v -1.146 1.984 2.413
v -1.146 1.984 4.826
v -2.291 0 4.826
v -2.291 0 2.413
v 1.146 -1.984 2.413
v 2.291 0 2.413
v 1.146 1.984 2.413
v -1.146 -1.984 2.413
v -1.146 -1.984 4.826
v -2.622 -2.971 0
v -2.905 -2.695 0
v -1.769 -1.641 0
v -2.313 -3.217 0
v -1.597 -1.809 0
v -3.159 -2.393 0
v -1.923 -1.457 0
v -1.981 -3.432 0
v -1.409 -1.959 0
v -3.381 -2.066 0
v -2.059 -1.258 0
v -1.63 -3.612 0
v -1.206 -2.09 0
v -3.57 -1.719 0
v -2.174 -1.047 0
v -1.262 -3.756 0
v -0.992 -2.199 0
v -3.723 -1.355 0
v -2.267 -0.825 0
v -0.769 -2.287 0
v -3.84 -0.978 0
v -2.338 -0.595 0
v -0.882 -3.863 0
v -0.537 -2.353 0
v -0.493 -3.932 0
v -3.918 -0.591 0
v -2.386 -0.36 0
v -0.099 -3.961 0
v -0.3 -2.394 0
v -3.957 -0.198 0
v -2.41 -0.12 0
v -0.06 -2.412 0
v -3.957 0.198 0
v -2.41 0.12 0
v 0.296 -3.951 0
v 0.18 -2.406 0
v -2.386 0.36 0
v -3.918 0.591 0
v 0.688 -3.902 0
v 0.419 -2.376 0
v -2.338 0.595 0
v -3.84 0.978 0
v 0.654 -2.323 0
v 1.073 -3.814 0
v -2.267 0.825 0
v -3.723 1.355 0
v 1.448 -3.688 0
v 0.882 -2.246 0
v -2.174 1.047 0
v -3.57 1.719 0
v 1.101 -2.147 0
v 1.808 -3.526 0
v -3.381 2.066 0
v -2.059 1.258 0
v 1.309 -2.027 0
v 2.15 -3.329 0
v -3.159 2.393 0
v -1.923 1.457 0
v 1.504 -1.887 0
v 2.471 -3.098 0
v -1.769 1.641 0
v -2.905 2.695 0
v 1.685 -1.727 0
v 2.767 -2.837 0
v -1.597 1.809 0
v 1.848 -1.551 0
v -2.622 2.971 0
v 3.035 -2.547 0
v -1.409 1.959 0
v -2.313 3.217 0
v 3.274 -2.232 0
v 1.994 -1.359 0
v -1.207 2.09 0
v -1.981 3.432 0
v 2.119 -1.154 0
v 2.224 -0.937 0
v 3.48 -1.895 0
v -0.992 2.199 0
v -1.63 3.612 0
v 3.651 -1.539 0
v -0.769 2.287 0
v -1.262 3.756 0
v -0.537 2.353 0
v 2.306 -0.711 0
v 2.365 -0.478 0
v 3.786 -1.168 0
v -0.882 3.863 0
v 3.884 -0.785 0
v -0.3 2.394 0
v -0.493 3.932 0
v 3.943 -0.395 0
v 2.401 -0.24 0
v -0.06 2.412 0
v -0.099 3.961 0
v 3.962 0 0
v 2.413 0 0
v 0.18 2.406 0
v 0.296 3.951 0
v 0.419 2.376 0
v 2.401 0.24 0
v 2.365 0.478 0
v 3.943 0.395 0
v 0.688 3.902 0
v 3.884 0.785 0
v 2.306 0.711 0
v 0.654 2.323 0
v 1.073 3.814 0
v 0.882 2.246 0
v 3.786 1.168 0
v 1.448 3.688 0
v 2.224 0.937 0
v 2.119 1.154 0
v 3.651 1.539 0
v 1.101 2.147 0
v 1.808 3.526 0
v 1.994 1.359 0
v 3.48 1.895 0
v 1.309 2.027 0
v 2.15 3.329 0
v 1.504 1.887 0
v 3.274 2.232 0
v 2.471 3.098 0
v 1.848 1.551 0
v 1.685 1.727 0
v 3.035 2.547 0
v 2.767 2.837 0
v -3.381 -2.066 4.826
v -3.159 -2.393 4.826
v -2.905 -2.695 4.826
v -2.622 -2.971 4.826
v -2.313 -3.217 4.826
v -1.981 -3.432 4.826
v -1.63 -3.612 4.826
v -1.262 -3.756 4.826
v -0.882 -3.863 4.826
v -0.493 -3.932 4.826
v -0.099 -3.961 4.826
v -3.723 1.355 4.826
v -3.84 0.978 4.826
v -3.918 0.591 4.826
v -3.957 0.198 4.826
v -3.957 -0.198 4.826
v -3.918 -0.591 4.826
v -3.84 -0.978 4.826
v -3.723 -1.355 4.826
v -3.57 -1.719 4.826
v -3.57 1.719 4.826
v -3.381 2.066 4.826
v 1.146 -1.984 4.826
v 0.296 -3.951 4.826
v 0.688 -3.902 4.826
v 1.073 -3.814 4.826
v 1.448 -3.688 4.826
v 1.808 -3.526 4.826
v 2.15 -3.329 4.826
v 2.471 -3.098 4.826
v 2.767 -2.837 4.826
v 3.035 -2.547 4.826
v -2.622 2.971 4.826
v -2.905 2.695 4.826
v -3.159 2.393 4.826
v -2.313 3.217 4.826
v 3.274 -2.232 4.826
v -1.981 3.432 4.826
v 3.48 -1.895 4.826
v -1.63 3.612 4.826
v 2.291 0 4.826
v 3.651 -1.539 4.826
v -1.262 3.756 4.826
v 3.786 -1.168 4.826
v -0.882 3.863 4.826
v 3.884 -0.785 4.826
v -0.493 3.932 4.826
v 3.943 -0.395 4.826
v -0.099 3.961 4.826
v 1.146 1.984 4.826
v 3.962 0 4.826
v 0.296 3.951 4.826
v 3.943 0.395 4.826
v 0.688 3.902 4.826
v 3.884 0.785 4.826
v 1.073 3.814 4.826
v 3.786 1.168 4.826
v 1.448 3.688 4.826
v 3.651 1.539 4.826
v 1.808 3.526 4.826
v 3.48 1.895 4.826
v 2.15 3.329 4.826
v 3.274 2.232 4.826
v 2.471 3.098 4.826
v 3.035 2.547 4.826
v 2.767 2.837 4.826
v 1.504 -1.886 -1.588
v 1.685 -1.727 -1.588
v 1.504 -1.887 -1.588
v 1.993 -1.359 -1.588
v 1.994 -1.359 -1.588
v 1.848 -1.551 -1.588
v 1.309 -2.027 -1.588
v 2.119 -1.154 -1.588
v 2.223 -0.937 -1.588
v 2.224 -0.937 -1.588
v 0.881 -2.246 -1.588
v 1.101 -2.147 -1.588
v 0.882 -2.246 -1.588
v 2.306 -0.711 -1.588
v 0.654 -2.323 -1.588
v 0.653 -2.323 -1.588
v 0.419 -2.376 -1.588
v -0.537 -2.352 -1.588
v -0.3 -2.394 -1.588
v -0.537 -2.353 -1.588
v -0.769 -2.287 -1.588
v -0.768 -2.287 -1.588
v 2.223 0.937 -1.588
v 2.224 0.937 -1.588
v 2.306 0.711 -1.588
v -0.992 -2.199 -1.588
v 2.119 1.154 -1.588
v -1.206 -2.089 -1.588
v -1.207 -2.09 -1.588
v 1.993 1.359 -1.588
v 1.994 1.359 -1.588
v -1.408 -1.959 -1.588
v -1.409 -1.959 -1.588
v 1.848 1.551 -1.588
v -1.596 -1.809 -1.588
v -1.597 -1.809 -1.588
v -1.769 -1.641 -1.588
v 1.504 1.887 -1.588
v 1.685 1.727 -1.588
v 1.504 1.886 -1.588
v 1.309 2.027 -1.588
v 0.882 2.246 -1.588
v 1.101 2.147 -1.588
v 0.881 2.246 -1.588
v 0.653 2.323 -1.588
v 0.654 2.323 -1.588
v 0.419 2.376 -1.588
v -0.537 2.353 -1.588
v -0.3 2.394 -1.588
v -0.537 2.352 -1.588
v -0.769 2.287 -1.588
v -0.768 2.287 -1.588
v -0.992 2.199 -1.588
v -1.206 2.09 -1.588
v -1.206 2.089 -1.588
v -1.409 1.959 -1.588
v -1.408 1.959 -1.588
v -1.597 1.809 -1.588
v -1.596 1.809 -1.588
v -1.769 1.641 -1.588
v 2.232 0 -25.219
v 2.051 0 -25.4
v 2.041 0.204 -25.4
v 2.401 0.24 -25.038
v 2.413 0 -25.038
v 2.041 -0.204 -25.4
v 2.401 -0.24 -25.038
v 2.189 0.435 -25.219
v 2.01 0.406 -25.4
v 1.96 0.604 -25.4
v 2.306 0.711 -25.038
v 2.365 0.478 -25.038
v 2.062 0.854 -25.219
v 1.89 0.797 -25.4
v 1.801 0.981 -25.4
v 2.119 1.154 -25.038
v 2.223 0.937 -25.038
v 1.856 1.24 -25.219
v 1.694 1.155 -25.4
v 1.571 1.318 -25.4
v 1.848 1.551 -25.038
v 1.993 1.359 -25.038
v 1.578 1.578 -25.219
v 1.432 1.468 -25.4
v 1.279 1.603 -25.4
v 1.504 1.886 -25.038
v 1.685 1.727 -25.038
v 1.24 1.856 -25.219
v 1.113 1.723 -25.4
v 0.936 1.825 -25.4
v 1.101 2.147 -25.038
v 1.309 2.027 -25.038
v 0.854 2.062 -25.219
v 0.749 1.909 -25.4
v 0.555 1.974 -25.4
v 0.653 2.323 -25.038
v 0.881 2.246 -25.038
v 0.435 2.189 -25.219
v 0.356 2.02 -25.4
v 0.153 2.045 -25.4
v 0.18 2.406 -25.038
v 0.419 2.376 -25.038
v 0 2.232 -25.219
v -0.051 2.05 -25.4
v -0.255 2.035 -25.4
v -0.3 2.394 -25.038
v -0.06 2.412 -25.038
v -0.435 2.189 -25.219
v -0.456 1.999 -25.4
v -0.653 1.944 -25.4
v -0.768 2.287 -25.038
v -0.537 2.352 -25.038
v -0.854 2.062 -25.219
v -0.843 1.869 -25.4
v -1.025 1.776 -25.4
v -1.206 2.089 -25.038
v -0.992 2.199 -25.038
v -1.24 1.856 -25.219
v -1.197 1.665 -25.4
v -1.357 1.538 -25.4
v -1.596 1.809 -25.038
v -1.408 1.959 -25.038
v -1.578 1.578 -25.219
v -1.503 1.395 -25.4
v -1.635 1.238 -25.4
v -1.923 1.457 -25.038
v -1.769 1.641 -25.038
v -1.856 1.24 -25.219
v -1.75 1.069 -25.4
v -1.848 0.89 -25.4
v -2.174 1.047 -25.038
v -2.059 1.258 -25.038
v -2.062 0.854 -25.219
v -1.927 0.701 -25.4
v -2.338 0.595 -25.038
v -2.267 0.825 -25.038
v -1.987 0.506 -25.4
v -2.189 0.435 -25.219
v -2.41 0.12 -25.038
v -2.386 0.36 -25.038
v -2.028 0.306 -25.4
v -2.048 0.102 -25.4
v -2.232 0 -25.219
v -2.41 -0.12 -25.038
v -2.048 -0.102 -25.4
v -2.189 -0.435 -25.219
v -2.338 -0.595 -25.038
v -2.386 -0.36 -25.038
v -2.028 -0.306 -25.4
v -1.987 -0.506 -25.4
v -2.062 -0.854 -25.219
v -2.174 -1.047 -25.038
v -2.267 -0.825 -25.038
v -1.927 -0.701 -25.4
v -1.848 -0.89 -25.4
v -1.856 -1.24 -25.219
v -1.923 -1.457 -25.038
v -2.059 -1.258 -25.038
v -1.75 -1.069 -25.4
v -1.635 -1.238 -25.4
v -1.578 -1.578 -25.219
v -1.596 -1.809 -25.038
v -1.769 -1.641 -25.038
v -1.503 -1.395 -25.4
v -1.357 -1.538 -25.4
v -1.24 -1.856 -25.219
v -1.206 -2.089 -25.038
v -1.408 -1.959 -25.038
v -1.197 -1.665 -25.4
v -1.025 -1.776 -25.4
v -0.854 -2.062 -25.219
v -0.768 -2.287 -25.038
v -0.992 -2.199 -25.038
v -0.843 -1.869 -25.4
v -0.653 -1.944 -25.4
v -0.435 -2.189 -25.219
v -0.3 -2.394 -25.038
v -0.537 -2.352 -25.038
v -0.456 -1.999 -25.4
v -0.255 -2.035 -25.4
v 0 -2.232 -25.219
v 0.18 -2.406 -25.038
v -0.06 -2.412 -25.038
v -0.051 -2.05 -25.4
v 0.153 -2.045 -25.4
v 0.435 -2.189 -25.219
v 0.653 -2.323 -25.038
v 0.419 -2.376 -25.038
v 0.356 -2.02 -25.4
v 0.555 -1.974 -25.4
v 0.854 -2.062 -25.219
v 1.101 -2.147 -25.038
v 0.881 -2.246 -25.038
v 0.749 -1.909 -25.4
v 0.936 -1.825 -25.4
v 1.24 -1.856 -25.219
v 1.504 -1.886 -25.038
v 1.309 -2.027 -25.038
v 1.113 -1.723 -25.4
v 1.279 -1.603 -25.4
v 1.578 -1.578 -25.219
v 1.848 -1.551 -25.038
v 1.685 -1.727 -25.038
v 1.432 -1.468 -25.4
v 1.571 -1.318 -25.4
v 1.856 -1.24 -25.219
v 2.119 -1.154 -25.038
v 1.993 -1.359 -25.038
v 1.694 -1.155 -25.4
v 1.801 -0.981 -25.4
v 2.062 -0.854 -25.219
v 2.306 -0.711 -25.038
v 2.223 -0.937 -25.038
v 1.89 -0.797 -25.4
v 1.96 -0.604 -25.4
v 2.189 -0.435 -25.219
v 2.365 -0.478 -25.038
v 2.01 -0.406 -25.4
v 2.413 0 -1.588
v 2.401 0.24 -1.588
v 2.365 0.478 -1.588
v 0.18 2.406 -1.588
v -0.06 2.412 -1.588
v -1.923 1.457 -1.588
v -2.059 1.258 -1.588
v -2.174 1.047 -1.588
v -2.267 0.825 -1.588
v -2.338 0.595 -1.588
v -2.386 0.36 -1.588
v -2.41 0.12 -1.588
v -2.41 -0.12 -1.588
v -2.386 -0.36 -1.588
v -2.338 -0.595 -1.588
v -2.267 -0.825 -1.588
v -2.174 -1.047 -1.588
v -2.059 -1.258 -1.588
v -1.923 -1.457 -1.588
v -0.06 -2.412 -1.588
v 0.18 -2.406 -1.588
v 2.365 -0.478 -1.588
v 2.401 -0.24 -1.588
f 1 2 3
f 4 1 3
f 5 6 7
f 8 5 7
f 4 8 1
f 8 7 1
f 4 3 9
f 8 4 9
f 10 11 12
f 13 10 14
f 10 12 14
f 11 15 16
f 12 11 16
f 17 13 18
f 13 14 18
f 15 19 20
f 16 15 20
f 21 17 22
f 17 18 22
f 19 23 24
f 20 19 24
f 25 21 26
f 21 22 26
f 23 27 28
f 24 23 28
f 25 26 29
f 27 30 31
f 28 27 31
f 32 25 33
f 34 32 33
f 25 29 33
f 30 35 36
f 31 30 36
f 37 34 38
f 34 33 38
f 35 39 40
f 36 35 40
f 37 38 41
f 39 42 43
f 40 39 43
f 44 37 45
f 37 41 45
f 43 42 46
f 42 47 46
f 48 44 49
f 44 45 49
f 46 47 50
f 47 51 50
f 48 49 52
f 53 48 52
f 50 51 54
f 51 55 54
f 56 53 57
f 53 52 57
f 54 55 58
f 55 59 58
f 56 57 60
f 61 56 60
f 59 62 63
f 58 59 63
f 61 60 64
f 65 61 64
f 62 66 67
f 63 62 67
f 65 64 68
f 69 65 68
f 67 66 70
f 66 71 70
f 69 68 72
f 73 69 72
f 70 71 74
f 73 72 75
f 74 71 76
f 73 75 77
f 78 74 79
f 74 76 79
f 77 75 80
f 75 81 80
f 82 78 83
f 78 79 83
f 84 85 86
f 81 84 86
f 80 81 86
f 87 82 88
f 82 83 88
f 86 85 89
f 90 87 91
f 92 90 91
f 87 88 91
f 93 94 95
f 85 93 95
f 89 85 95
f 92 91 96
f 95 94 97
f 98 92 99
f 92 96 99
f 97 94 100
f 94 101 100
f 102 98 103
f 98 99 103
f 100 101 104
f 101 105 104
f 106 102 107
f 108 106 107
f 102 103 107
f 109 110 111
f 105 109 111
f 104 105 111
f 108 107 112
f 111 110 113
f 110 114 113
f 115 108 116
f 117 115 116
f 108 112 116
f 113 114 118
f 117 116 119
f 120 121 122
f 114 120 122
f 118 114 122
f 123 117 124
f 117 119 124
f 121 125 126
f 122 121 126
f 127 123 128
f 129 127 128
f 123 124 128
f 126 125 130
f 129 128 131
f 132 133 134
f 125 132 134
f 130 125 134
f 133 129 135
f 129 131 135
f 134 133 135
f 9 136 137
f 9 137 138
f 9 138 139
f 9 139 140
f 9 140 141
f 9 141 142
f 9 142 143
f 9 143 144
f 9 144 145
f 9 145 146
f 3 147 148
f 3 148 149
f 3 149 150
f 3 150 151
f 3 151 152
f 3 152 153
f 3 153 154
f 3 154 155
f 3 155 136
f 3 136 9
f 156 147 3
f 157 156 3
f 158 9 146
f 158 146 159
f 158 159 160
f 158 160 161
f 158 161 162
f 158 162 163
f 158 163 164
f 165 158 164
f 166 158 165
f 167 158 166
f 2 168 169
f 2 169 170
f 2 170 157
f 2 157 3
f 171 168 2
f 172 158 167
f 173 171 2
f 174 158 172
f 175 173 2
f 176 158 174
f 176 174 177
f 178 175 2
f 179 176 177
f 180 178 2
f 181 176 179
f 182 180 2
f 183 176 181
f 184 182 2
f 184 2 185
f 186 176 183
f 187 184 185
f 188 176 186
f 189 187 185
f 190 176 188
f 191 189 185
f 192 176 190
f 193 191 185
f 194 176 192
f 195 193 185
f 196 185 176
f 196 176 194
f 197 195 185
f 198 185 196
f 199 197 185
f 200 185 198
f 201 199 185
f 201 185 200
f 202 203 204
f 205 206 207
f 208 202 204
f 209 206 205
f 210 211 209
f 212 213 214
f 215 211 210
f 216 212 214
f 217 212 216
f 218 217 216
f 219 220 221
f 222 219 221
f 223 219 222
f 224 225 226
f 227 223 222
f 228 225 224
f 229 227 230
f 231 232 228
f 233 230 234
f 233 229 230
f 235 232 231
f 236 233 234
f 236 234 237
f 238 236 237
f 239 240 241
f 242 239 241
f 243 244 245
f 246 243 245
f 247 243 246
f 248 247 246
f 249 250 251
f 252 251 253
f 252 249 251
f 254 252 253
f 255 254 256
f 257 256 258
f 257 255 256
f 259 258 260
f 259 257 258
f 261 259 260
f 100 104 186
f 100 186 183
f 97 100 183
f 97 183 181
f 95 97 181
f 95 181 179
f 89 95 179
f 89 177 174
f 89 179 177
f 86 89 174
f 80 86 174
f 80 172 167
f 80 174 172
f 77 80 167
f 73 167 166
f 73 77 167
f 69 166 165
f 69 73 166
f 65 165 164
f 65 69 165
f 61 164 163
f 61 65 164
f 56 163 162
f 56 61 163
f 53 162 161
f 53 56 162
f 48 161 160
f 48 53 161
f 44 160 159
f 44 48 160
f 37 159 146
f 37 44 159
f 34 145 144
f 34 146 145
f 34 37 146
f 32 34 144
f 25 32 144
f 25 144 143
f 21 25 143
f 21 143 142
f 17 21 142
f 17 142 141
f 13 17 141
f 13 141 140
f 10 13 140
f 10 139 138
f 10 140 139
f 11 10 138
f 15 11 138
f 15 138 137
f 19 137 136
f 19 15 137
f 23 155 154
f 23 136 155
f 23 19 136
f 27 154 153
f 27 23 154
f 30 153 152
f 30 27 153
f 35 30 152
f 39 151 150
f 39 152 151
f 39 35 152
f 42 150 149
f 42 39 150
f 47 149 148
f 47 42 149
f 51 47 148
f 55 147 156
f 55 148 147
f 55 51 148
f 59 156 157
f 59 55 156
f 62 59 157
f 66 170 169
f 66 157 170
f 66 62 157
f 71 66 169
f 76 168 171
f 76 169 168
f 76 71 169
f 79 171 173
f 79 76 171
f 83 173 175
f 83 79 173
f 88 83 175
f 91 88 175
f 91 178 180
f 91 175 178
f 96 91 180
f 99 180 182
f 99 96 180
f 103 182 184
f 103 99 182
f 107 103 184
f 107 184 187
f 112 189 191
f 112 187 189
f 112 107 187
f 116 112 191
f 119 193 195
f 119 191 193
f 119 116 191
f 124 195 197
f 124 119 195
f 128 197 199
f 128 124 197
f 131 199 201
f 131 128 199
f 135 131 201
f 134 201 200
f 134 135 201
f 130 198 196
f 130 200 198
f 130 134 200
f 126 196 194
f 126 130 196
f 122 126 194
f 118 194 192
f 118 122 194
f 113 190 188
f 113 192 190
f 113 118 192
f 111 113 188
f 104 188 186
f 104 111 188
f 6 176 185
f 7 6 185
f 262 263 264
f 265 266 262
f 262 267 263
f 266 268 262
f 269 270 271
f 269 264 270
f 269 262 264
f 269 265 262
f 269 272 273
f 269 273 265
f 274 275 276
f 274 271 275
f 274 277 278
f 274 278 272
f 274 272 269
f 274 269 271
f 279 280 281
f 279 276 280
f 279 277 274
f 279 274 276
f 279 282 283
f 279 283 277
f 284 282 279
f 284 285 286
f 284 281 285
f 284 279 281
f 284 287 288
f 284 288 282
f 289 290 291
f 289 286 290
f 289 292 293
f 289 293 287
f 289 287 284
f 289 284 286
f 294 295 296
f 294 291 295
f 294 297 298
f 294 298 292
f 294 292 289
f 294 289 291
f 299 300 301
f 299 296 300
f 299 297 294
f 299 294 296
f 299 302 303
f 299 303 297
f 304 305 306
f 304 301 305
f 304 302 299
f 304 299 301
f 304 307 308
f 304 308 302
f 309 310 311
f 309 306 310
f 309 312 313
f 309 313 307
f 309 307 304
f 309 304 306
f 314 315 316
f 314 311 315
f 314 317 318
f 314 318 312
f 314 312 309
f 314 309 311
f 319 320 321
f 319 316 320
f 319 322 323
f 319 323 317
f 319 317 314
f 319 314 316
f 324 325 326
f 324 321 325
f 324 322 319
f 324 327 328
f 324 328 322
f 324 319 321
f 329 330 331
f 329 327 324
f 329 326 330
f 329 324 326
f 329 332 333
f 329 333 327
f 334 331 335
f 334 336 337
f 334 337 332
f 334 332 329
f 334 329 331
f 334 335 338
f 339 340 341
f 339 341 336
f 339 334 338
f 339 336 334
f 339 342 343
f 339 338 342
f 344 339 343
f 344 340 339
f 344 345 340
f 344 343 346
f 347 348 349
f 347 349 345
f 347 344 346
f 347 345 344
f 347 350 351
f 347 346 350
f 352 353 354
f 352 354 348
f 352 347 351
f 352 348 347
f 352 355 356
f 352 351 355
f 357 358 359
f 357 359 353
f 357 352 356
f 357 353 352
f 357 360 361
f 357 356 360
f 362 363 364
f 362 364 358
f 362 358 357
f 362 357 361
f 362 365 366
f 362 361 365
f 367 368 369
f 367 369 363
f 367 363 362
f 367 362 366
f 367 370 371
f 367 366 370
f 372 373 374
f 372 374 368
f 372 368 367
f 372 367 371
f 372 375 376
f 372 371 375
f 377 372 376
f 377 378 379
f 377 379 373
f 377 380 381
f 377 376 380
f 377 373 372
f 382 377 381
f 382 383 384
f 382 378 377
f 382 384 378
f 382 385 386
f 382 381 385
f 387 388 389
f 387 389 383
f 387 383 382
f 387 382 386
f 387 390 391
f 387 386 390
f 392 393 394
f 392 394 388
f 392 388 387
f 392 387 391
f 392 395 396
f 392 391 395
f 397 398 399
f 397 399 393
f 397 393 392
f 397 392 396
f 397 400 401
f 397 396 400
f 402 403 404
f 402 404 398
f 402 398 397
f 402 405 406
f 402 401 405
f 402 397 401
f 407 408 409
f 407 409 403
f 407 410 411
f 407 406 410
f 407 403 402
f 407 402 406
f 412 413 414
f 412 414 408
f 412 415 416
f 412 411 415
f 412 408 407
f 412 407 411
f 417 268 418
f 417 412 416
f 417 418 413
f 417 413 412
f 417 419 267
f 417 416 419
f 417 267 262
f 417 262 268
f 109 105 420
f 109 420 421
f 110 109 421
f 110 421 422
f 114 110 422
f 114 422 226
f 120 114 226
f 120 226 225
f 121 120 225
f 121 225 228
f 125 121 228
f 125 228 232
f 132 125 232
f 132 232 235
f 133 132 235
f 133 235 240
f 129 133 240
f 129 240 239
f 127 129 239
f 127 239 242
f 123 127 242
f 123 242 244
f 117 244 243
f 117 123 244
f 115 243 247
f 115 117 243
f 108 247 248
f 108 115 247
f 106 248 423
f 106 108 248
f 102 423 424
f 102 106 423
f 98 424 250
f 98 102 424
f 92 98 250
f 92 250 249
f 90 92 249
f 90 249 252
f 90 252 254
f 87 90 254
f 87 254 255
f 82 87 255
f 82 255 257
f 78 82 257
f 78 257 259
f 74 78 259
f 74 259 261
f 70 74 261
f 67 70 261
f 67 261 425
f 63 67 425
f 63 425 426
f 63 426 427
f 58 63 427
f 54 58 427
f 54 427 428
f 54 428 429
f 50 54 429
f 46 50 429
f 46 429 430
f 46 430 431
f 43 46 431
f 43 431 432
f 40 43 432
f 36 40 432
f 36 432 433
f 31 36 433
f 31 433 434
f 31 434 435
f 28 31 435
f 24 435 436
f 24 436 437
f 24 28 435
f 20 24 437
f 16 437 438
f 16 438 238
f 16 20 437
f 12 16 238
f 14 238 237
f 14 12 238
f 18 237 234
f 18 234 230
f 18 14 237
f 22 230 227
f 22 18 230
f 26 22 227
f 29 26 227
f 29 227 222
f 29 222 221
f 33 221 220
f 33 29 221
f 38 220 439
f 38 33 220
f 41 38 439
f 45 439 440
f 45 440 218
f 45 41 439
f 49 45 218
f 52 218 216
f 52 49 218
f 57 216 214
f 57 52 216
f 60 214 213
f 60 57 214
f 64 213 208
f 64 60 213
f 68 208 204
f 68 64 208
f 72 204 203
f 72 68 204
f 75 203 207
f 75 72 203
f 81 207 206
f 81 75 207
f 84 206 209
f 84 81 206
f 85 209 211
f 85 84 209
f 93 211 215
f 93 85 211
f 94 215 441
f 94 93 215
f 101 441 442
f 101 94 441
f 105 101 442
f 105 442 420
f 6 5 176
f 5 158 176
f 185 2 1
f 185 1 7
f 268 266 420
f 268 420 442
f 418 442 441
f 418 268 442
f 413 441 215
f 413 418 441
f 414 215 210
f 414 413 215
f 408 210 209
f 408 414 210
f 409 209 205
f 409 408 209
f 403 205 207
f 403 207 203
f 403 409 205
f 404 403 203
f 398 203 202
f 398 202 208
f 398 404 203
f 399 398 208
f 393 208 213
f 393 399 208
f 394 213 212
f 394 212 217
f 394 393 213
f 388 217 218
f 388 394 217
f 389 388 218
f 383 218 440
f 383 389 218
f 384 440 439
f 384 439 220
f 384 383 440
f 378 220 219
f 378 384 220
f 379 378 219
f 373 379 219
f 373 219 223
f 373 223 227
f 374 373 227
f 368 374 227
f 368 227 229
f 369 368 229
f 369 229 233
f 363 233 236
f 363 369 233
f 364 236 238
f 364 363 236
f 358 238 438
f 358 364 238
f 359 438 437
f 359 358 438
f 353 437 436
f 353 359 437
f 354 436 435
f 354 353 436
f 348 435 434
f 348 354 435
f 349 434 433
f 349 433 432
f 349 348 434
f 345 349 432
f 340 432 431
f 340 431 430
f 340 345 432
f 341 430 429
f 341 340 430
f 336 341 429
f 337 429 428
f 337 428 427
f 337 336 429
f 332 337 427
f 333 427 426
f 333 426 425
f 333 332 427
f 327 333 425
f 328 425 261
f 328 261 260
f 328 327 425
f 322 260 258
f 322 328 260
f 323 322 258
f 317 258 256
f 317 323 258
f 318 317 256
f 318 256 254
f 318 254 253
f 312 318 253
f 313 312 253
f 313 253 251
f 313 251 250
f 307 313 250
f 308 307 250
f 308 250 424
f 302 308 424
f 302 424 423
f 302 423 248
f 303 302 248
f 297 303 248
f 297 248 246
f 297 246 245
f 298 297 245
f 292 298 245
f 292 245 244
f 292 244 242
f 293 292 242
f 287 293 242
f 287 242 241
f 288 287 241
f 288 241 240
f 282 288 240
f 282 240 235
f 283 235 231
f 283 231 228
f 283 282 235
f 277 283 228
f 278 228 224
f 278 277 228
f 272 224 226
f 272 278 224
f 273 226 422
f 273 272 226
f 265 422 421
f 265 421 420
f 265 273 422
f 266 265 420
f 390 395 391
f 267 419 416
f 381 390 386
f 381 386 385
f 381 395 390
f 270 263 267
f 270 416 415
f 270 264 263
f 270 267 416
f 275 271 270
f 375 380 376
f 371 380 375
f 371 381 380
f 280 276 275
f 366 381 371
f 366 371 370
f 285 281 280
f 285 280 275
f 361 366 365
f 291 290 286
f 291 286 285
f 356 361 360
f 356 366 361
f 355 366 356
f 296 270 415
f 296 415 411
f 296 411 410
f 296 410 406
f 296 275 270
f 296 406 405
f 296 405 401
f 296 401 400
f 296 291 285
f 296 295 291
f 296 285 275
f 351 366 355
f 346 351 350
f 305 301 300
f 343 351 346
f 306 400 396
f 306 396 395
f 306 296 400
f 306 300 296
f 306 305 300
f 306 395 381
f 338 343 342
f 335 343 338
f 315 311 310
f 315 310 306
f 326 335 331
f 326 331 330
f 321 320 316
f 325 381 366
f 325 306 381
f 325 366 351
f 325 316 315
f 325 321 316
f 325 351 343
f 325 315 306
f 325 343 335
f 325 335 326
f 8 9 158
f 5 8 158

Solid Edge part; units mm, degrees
sketch "Sketch1" plane through (0, 0, 0) normal (0, 0, 1) x (1, 0, 0)
  circle A0 centre (0, 0) radius 3.9624
  dimension "D1" = 7.9248
extrude "Protrusion1" add sketch "Sketch1" along normal blind 4.826
sketch "Sketch2" plane through (0, 0, 0) normal (0, 0, -1) x (1, 0, 0)
  circle A0 centre (0, 0) radius 2.413
extrude "Protrusion2" add sketch "Sketch2" along normal blind 25.4
sketch "Sketch3" plane through (0, 0, -25.4) normal (0, 0, -1) x (1, 0, 0)
  circle A0 centre (0, 0) radius 2.4127
extrude "Cutout1" cut sketch "Sketch3" against normal blind 23.8125 flip side to cut
chamfer "Chamfer_1" distance 0.3619 angle 45 1 edges at (-2.4127, 0, -25.4)
sketch "Sketch4" plane through (0, 0, 4.826) normal (0, 0, 1) x (1, 0, 0)
  line L0 (-1.1457, 1.9844) -> (1.1457, 1.9844)
  line L1 (2.2914, 0) -> (1.1457, 1.9844)
  line L2 (1.1457, -1.9844) -> (2.2914, 0)
  line L3 (-1.1457, -1.9844) -> (1.1457, -1.9844)
  line L4 (-2.2914, 0) -> (-1.1457, -1.9844)
  line L5 (-1.1457, 1.9844) -> (-2.2914, 0)
  dimension "D1" = 3.9688
extrude "Cutout2" cut sketch "Sketch4" against normal blind 2.413
properties part number "24101594"
